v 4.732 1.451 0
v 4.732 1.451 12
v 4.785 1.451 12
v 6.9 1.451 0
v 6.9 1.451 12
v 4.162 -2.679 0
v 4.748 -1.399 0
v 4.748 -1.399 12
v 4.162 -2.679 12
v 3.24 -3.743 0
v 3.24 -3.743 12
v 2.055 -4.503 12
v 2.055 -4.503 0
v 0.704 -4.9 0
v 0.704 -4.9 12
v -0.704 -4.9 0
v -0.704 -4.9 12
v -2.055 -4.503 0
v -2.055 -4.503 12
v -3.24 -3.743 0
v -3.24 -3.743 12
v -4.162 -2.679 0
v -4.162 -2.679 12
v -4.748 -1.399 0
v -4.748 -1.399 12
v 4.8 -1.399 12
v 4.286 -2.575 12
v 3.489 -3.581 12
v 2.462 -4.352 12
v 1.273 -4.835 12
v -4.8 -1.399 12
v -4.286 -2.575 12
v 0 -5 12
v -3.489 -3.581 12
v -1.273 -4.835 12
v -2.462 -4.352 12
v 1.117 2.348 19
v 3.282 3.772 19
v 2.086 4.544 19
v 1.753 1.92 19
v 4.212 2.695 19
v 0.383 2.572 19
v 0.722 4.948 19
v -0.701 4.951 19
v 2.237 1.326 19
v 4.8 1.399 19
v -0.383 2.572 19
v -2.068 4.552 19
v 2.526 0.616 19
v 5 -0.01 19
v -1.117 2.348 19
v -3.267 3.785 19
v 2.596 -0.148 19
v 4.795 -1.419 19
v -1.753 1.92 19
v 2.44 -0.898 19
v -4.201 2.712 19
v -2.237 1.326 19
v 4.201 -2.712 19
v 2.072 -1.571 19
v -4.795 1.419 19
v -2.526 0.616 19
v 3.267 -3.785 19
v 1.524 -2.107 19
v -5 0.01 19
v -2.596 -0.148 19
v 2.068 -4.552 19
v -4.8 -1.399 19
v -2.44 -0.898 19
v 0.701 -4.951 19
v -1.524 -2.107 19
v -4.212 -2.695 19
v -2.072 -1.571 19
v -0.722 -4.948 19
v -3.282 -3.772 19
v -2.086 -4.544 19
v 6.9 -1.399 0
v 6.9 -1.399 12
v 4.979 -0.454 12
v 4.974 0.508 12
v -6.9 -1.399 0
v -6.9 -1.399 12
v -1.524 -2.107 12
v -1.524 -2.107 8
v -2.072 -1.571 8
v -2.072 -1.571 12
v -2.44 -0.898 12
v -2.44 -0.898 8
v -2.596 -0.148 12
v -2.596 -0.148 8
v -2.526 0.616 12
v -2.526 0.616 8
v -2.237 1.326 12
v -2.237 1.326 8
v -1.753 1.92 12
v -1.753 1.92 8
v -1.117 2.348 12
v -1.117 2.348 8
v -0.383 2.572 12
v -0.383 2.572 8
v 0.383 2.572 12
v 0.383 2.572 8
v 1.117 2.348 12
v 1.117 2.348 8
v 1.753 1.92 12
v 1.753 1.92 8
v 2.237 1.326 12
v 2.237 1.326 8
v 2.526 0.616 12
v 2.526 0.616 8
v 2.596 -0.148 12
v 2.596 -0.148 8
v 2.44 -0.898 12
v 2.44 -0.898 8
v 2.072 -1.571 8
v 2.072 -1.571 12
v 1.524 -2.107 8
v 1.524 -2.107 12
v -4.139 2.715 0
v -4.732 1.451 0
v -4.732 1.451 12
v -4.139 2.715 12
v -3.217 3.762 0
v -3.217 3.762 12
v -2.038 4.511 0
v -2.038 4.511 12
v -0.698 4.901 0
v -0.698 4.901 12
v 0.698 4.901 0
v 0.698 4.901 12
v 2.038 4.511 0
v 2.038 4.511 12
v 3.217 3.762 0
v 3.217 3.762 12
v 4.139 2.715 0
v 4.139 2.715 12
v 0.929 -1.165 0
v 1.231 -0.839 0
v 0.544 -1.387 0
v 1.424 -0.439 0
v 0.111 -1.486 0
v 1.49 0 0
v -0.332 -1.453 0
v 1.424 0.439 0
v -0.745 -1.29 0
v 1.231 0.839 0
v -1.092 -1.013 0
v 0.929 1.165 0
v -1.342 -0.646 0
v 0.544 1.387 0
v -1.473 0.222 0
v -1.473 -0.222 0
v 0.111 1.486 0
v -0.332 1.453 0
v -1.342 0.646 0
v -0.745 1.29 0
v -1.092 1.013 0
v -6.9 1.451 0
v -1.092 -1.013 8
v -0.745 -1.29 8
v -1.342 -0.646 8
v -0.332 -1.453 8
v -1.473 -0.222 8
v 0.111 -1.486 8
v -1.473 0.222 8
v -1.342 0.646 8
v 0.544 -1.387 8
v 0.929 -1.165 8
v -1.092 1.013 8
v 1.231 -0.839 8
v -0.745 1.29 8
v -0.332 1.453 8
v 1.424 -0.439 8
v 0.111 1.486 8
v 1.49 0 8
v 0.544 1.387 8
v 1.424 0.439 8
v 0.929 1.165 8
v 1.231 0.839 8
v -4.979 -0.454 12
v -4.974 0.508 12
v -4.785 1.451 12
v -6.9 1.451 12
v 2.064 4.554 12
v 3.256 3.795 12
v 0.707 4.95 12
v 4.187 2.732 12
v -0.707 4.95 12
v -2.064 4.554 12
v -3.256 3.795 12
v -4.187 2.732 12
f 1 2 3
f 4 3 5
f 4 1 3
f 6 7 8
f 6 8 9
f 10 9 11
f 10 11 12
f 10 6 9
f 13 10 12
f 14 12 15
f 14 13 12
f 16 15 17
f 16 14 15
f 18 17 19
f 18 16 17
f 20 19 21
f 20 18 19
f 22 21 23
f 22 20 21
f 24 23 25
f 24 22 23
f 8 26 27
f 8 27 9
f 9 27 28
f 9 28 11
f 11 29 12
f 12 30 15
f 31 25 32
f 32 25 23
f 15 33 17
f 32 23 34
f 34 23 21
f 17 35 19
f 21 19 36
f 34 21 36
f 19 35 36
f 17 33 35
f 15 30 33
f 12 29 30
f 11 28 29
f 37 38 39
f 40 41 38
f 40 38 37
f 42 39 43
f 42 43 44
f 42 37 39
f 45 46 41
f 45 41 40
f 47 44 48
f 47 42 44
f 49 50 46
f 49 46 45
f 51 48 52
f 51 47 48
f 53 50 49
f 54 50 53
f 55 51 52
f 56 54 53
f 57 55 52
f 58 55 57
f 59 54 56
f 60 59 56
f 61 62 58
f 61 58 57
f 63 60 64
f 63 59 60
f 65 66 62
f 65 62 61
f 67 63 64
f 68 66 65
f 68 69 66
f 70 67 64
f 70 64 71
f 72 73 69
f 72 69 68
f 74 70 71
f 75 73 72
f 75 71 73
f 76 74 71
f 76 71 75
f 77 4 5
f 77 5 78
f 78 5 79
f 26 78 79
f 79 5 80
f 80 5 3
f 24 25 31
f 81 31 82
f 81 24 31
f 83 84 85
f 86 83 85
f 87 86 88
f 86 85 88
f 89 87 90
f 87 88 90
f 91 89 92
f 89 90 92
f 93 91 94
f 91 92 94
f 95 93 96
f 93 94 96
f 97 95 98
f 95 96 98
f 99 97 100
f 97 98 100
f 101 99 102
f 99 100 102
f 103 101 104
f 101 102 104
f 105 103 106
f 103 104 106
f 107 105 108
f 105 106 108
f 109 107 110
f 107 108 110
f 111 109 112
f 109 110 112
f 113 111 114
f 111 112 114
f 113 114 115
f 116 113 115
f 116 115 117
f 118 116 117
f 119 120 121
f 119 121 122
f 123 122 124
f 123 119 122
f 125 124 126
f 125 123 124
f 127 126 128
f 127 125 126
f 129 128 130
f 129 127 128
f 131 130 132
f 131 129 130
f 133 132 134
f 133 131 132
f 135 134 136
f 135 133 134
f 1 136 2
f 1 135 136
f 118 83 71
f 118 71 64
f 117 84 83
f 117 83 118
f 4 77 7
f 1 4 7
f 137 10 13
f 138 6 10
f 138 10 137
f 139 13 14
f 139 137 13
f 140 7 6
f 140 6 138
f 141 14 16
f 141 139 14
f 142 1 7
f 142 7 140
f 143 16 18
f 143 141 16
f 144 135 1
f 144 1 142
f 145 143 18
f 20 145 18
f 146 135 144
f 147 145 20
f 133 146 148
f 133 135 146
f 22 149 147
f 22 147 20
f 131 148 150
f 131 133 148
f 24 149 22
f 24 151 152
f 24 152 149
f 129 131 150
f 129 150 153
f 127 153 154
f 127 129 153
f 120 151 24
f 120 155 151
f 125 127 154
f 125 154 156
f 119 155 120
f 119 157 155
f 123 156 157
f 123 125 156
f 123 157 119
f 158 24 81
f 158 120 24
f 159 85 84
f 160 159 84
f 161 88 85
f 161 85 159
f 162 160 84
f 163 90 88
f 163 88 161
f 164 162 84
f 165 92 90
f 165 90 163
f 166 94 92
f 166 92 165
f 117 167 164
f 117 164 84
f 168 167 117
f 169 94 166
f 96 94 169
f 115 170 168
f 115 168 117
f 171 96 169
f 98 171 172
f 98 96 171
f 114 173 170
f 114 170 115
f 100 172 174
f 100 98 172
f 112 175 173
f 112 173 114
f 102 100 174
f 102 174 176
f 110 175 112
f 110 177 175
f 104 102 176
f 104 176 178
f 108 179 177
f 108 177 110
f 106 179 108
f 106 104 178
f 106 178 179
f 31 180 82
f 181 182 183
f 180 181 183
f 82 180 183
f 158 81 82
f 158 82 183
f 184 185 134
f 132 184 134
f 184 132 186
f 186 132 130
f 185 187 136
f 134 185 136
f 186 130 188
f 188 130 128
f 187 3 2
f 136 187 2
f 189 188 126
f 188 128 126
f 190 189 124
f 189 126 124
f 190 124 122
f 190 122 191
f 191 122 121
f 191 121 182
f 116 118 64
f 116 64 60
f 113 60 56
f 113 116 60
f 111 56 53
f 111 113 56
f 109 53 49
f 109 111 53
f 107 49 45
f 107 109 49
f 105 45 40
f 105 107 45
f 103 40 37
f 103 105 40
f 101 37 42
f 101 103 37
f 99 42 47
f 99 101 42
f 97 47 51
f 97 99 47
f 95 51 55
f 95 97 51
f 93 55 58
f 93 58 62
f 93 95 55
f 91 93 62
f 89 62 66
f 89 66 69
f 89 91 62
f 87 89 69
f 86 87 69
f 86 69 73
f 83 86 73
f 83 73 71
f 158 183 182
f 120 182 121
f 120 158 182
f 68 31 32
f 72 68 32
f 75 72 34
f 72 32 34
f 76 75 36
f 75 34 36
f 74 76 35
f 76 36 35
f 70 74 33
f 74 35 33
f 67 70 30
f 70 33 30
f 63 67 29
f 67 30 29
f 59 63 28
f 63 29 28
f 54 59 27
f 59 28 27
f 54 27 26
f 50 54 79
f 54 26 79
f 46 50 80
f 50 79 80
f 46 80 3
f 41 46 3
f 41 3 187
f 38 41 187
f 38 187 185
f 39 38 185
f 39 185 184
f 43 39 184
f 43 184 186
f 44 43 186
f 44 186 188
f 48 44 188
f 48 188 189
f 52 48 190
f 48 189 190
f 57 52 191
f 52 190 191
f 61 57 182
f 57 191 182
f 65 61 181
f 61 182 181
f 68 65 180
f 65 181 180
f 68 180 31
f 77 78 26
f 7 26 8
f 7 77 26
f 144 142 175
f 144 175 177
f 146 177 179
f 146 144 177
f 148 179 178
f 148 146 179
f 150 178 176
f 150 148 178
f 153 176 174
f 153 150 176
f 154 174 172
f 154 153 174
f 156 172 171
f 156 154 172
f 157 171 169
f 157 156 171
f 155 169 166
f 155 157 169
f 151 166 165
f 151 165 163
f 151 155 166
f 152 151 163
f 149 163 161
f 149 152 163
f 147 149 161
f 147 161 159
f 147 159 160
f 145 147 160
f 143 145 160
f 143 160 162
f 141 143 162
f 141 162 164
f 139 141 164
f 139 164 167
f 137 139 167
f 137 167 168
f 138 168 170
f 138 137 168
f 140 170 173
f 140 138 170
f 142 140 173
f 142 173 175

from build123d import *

# Parameters (mm, degrees)
Y_KSEKLIK_EKSTR_ZYON1_DEPTH = 12
IZIM3_R                     = 5
Y_KSEKLIK_EKSTR_ZYON3_DEPTH = 7
IZIM2_R                     = 2.701874654
IZIM2_R_2                   = 1.49
Y_KSEKLIK_EKSTR_ZYON2_DEPTH = 8


with BuildPart() as part:
    # Çizim1 → Yükseklik-Ekstrüzyon1 (new body)
    with BuildSketch(Plane.XY):
        with BuildLine():
            Line((4.73249152, 1.451214667), (6.9, 1.451214667))
            Line((6.9, 1.451214667), (6.9, -1.398785333))
            Line((6.9, -1.398785333), (4.748252267, -1.398785333))
            ThreePointArc((4.748252267, -1.398785333), (0, -4.95), (-4.748252267, -1.398785333))
            Line((-4.748252267, -1.398785333), (-6.9, -1.398785333))
            Line((-6.9, -1.398785333), (-6.9, 1.451214667))
            Line((-6.9, 1.451214667), (-4.73249152, 1.451214667))
            ThreePointArc((-4.73249152, 1.451214667), (0, 4.95), (4.73249152, 1.451214667))
        make_face()
        with BuildLine():
            Line((1.523723566, -2.106719368), (-1.523723566, -2.106719368))
            ThreePointArc((-1.523723566, -2.106719368), (0, 2.6), (1.523723566, -2.106719368))
        make_face(mode=Mode.SUBTRACT)
    extrude(amount=Y_KSEKLIK_EKSTR_ZYON1_DEPTH)

    # Çizim3 → Yükseklik-Ekstrüzyon3 (add)
    with BuildSketch(Plane.XY.offset(12)):
        with Locations(Location((0, 0, 0), (0, 0, 196.245706225))):
            Circle(IZIM3_R)
        with BuildLine():
            Line((-1.523723566, -2.106719368), (1.523723566, -2.106719368))
            ThreePointArc((1.523723566, -2.106719368), (0, 2.6), (-1.523723566, -2.106719368))
        make_face(mode=Mode.SUBTRACT)
    extrude(amount=Y_KSEKLIK_EKSTR_ZYON3_DEPTH)

    # Çizim2 → Yükseklik-Ekstrüzyon2 (add)
    with BuildSketch(Plane.XY):
        Circle(IZIM2_R)
        Circle(IZIM2_R_2, mode=Mode.SUBTRACT)
    extrude(amount=Y_KSEKLIK_EKSTR_ZYON2_DEPTH)


solid = part.part
